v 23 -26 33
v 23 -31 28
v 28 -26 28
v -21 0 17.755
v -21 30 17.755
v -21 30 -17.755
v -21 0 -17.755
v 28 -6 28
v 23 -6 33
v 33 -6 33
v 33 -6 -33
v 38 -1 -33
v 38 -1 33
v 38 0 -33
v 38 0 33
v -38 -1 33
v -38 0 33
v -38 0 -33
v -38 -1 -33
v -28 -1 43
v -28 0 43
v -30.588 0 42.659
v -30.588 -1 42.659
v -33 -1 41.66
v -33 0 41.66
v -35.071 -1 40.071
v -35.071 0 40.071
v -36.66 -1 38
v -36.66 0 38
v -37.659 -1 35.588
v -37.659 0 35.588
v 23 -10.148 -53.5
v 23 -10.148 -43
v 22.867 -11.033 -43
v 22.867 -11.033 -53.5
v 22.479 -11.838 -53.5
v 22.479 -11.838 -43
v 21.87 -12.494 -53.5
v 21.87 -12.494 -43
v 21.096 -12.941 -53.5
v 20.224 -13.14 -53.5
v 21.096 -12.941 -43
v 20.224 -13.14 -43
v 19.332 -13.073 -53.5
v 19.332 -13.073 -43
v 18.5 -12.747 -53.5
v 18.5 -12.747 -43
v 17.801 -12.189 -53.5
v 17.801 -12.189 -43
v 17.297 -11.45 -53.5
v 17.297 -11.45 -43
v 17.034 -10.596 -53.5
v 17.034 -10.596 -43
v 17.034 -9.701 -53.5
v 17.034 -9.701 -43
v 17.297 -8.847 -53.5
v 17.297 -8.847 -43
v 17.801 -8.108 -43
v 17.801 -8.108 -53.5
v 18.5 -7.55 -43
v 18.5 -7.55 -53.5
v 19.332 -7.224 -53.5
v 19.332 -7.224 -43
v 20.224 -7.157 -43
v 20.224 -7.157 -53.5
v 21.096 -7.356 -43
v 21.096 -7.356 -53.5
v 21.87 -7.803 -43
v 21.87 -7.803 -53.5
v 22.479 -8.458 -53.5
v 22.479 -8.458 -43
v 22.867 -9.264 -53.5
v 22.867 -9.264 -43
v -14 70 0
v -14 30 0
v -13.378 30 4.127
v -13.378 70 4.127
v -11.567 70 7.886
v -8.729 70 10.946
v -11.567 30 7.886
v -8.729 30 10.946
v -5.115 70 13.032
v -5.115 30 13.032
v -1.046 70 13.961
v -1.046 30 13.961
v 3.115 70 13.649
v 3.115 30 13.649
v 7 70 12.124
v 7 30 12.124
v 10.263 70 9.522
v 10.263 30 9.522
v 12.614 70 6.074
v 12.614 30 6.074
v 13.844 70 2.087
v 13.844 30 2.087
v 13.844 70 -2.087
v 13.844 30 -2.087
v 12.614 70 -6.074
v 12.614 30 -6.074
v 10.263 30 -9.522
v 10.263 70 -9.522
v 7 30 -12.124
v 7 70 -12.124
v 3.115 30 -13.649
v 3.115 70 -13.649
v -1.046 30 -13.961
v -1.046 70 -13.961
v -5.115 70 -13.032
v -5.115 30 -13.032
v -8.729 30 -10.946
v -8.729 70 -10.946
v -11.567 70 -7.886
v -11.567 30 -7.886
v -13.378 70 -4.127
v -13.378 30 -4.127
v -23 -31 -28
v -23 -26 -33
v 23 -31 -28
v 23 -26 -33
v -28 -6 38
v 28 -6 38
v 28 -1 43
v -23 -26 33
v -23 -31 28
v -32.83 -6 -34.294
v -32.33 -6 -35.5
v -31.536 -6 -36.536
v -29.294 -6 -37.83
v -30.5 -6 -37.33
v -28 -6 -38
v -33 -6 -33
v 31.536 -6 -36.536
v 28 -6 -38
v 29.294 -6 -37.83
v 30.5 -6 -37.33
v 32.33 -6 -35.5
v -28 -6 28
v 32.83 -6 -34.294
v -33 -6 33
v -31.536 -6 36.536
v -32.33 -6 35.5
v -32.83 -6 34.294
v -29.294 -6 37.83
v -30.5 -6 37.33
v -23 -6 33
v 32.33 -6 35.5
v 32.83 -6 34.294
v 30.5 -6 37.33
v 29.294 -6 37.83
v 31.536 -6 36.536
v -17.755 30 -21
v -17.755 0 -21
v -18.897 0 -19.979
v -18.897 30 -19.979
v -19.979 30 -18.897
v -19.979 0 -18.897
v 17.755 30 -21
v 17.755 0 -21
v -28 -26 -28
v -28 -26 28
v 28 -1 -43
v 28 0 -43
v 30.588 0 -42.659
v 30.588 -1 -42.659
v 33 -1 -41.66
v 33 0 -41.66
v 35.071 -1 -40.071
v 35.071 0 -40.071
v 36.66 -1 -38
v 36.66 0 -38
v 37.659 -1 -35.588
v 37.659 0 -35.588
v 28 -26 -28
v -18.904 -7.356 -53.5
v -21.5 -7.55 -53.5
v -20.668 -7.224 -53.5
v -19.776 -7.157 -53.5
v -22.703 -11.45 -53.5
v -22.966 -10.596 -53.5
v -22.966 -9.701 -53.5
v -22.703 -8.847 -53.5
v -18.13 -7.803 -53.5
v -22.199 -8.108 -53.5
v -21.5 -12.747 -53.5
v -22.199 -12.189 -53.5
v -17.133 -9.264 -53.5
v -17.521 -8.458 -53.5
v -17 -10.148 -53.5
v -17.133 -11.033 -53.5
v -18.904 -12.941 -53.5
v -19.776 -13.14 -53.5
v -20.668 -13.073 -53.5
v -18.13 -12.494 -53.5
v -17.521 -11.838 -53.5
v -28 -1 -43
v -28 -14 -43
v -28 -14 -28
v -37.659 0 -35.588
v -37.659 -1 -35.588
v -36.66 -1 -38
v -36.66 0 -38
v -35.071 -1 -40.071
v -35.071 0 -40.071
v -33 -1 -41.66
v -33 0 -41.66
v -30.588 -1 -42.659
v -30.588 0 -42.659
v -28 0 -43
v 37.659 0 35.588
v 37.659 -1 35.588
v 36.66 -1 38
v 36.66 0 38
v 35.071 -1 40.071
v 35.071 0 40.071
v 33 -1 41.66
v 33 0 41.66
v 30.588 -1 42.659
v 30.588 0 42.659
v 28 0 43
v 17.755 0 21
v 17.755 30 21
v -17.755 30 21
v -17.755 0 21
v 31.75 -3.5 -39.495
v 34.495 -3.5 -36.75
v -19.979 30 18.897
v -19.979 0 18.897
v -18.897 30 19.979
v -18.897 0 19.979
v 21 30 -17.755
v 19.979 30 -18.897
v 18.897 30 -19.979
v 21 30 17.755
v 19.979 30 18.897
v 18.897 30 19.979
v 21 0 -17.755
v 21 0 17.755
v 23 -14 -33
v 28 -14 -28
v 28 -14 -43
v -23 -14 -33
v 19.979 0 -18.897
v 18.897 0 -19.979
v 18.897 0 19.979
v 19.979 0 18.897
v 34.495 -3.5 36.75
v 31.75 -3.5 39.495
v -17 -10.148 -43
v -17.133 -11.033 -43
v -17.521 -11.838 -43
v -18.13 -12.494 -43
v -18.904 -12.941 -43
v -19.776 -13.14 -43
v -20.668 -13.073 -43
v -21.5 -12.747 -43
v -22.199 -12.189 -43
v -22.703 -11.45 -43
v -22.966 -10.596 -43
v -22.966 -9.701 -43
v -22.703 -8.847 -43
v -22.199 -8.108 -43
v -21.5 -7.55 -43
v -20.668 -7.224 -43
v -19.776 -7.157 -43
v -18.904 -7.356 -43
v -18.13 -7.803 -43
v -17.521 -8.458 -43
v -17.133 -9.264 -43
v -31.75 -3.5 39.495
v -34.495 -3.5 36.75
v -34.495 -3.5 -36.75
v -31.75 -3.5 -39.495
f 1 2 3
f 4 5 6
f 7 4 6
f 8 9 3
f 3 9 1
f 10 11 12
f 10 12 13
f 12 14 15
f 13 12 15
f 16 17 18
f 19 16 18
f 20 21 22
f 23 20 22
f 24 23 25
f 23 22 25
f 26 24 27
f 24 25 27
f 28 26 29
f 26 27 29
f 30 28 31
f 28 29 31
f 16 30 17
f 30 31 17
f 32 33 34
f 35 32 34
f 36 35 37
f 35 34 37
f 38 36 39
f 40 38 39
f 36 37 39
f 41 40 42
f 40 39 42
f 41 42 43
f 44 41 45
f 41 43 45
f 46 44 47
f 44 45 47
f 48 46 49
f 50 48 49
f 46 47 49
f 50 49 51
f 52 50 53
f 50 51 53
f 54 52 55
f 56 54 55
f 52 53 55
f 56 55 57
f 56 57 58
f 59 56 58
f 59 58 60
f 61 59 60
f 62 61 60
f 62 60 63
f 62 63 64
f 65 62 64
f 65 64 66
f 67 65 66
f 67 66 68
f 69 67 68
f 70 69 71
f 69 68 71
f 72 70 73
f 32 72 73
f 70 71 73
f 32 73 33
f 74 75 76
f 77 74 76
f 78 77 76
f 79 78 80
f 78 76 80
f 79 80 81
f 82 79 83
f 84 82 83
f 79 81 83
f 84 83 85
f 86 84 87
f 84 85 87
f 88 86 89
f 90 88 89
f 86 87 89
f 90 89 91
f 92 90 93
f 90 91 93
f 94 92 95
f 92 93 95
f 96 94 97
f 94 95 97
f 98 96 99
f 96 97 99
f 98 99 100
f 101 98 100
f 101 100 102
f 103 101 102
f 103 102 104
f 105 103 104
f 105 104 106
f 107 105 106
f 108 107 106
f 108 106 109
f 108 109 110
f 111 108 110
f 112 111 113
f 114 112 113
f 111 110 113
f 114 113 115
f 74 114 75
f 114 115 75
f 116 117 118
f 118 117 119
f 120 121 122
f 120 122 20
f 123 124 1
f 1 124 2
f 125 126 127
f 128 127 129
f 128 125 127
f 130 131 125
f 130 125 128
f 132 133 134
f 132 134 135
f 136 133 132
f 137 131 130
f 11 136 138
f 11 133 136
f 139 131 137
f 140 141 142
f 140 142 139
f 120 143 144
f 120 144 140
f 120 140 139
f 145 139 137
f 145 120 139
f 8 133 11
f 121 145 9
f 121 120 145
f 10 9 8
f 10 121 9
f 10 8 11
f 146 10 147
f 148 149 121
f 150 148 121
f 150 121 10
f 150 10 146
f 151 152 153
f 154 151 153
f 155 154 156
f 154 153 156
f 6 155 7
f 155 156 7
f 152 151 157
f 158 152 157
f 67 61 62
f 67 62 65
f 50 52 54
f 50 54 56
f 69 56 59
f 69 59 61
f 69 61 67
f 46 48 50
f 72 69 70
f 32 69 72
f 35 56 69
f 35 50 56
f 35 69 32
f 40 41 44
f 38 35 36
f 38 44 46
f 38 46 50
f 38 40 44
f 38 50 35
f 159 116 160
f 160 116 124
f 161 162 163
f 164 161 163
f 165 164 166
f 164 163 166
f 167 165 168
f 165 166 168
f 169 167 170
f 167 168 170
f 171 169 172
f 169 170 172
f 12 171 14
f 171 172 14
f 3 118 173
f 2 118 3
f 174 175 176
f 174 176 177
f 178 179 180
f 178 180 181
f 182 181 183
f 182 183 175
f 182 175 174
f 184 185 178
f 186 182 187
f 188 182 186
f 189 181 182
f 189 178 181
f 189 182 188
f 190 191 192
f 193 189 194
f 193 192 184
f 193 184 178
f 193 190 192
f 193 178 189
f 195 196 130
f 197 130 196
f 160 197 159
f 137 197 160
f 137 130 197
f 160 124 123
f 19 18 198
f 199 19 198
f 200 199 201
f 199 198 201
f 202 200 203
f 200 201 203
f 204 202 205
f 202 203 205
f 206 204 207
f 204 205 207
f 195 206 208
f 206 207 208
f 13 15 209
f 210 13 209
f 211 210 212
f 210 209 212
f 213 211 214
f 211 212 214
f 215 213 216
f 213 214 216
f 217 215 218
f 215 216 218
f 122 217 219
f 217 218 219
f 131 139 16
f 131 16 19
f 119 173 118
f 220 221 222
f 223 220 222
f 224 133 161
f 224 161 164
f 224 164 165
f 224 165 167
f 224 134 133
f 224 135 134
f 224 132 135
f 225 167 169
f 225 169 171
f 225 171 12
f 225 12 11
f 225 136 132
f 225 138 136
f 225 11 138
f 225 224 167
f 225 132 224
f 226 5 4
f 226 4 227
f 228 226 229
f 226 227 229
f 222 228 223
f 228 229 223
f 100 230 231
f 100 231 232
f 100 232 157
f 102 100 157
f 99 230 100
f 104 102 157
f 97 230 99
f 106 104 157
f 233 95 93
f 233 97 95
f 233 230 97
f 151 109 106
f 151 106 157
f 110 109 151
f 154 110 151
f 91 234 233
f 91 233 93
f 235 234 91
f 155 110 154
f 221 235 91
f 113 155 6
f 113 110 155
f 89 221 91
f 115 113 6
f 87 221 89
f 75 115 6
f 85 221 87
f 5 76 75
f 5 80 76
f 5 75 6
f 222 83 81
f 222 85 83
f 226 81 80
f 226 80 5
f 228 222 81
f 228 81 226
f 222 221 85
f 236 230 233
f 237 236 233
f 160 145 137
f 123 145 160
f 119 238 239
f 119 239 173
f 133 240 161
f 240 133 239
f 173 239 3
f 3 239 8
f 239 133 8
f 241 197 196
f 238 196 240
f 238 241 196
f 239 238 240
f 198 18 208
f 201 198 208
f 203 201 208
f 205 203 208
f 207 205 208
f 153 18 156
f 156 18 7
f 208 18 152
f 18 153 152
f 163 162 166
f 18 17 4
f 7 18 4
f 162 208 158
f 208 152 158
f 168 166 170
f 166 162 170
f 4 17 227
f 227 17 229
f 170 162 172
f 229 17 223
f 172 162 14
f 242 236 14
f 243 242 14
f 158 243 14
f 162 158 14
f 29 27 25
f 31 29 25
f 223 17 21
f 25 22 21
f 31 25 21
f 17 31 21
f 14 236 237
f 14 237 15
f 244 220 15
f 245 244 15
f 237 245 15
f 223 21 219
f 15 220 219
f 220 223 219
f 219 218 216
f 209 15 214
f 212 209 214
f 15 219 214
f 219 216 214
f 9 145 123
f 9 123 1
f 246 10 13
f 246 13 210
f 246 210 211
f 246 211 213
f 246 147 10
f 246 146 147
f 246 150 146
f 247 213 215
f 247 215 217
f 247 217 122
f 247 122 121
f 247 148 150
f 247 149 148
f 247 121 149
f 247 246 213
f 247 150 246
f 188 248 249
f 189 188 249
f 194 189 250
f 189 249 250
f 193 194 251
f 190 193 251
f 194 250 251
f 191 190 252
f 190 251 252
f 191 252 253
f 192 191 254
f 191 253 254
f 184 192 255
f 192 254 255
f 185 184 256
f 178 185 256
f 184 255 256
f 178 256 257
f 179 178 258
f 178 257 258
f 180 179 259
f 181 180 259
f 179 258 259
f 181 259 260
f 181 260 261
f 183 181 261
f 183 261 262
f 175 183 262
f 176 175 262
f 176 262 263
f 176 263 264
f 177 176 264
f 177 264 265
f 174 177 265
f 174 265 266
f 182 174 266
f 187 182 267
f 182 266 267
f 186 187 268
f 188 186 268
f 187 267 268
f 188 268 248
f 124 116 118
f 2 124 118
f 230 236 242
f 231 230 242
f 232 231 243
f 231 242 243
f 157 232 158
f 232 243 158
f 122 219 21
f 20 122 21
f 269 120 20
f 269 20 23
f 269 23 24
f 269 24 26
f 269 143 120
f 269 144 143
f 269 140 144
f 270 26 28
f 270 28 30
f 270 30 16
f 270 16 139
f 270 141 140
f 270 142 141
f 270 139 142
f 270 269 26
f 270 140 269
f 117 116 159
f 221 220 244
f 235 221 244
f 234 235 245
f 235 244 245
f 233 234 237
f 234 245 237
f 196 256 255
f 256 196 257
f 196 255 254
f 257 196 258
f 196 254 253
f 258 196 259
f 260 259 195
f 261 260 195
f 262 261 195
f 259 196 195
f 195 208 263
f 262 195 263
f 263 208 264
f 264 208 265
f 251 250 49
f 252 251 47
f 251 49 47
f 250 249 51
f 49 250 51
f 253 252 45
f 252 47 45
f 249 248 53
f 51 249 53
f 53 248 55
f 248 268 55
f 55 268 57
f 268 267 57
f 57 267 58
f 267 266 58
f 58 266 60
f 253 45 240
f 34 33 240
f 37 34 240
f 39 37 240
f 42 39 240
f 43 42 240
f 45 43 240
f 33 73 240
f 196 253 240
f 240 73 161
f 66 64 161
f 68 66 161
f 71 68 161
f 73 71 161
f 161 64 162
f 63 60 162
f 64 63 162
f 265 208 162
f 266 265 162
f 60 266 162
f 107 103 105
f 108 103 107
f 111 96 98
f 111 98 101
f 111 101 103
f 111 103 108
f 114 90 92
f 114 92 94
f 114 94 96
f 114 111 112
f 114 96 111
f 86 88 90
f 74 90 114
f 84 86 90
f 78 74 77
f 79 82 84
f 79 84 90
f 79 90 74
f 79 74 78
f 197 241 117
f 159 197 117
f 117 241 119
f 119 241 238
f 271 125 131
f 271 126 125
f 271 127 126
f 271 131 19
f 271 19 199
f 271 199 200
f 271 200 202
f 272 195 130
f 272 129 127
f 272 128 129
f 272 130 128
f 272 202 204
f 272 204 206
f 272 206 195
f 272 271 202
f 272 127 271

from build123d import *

# Parameters (mm, degrees)
F1_DEPTH  = 6
F2_R      = 27.5
F3_DEPTH  = 30
F4_R      = 14
F5_DEPTH  = 40
F6_W      = 56
F6_H      = 10
F7_DEPTH  = 8
F8_R      = 3
F9_DEPTH  = 10.5
F10_W     = 56
F10_H     = 66
F11_DEPTH = 25
F12_SIZE  = 5
F14_DEPTH = 30


with BuildPart() as f1:
    # F0 (on Front) → F1 (new body)
    with BuildSketch(Plane.XZ):
        with BuildLine():
            ThreePointArc((38, 33), (35.0710678119, 40.0710678119), (28, 43))
            Line((28, 43), (-28, 43))
            ThreePointArc((-28, 43), (-35.0710678119, 40.0710678119), (-38, 33))
            Line((-38, 33), (-38, -33))
            ThreePointArc((-38, -33), (-35.0710678119, -40.0710678119), (-28, -43))
            Line((-28, -43), (28, -43))
            ThreePointArc((28, -43), (35.0710678119, -40.0710678119), (38, -33))
            Line((38, -33), (38, 33))
        make_face()
    extrude(amount=F1_DEPTH)

    # F2 (on face) → F3 (join)
    with BuildSketch(Plane(origin=(0, 0, 0), x_dir=(-1, 0, 0), z_dir=(0, 1, 0))):
        Circle(F2_R)
    extrude(amount=F3_DEPTH)

    # F4 (on face) → F5 (join)
    with BuildSketch(Plane(origin=(0, 30, 0), x_dir=(-1, 0, 0), z_dir=(0, 1, 0))):
        Circle(F4_R)
    extrude(amount=F5_DEPTH)

    # F6 (on face) → F7 (join)
    with BuildSketch(Plane.XZ.offset(6)):
        with Locations((0, -38)):
            Rectangle(F6_W, F6_H)
    extrude(amount=F7_DEPTH)

    # F8 (on face) → F9 (join)
    with BuildSketch(Plane(origin=(0, 0, -43), x_dir=(1, 0, 0), z_dir=(0, 0, -1))):
        with Locations((-20, 10.148444213)):
            Circle(F8_R)
        with Locations((20, 10.148444213)):
            Circle(F8_R)
    extrude(amount=F9_DEPTH)

    # F10 (on face) → F11 (join)
    with BuildSketch(Plane.XZ.offset(6)):
        Rectangle(F10_W, F10_H)
    extrude(amount=F11_DEPTH)

    # F12
    f12_edges = [f1.edges().sort_by_distance(p)[0] for p in [
        (0, -31, 33),
        (28, -31, 0),
        (-28, -31, 0),
        (-28, -18.5, 33),
        (28, -18.5, 33),
        (28, -22.5, -33),
        (0, -31, -33),
        (-28, -22.5, -33),
        (0, -6, 43),
    ]]
    chamfer(f12_edges, length=F12_SIZE)

    # F13 (on face) → F14 (cut, through all)
    with BuildSketch(Plane(origin=(0, 30, 0), x_dir=(-1, 0, 0), z_dir=(0, 1, 0))):
        with BuildLine():
            Line((-17.7552809046, 21), (17.7552809046, 21))
            ThreePointArc((17.7552809046, 21), (0, 27.5), (-17.7552809046, 21))
        make_face()
        with BuildLine():
            ThreePointArc((27.5, 0), (25.8239230172, 9.4538352006), (21, 17.7552809046))
            Line((21, 17.7552809046), (21, -17.7552809046))
            ThreePointArc((21, -17.7552809046), (25.8239230172, -9.4538352006), (27.5, 0))
        make_face()
        with BuildLine():
            ThreePointArc((-17.7552809046, -21), (0, -27.5), (17.7552809046, -21))
            Line((17.7552809046, -21), (-17.7552809046, -21))
        make_face()
        with BuildLine():
            Line((-21, -17.7552809046), (-21, 17.7552809046))
            ThreePointArc((-21, 17.7552809046), (-27.5, 0), (-21, -17.7552809046))
        make_face()
    extrude(amount=-F14_DEPTH, mode=Mode.SUBTRACT)


solid = f1.part
